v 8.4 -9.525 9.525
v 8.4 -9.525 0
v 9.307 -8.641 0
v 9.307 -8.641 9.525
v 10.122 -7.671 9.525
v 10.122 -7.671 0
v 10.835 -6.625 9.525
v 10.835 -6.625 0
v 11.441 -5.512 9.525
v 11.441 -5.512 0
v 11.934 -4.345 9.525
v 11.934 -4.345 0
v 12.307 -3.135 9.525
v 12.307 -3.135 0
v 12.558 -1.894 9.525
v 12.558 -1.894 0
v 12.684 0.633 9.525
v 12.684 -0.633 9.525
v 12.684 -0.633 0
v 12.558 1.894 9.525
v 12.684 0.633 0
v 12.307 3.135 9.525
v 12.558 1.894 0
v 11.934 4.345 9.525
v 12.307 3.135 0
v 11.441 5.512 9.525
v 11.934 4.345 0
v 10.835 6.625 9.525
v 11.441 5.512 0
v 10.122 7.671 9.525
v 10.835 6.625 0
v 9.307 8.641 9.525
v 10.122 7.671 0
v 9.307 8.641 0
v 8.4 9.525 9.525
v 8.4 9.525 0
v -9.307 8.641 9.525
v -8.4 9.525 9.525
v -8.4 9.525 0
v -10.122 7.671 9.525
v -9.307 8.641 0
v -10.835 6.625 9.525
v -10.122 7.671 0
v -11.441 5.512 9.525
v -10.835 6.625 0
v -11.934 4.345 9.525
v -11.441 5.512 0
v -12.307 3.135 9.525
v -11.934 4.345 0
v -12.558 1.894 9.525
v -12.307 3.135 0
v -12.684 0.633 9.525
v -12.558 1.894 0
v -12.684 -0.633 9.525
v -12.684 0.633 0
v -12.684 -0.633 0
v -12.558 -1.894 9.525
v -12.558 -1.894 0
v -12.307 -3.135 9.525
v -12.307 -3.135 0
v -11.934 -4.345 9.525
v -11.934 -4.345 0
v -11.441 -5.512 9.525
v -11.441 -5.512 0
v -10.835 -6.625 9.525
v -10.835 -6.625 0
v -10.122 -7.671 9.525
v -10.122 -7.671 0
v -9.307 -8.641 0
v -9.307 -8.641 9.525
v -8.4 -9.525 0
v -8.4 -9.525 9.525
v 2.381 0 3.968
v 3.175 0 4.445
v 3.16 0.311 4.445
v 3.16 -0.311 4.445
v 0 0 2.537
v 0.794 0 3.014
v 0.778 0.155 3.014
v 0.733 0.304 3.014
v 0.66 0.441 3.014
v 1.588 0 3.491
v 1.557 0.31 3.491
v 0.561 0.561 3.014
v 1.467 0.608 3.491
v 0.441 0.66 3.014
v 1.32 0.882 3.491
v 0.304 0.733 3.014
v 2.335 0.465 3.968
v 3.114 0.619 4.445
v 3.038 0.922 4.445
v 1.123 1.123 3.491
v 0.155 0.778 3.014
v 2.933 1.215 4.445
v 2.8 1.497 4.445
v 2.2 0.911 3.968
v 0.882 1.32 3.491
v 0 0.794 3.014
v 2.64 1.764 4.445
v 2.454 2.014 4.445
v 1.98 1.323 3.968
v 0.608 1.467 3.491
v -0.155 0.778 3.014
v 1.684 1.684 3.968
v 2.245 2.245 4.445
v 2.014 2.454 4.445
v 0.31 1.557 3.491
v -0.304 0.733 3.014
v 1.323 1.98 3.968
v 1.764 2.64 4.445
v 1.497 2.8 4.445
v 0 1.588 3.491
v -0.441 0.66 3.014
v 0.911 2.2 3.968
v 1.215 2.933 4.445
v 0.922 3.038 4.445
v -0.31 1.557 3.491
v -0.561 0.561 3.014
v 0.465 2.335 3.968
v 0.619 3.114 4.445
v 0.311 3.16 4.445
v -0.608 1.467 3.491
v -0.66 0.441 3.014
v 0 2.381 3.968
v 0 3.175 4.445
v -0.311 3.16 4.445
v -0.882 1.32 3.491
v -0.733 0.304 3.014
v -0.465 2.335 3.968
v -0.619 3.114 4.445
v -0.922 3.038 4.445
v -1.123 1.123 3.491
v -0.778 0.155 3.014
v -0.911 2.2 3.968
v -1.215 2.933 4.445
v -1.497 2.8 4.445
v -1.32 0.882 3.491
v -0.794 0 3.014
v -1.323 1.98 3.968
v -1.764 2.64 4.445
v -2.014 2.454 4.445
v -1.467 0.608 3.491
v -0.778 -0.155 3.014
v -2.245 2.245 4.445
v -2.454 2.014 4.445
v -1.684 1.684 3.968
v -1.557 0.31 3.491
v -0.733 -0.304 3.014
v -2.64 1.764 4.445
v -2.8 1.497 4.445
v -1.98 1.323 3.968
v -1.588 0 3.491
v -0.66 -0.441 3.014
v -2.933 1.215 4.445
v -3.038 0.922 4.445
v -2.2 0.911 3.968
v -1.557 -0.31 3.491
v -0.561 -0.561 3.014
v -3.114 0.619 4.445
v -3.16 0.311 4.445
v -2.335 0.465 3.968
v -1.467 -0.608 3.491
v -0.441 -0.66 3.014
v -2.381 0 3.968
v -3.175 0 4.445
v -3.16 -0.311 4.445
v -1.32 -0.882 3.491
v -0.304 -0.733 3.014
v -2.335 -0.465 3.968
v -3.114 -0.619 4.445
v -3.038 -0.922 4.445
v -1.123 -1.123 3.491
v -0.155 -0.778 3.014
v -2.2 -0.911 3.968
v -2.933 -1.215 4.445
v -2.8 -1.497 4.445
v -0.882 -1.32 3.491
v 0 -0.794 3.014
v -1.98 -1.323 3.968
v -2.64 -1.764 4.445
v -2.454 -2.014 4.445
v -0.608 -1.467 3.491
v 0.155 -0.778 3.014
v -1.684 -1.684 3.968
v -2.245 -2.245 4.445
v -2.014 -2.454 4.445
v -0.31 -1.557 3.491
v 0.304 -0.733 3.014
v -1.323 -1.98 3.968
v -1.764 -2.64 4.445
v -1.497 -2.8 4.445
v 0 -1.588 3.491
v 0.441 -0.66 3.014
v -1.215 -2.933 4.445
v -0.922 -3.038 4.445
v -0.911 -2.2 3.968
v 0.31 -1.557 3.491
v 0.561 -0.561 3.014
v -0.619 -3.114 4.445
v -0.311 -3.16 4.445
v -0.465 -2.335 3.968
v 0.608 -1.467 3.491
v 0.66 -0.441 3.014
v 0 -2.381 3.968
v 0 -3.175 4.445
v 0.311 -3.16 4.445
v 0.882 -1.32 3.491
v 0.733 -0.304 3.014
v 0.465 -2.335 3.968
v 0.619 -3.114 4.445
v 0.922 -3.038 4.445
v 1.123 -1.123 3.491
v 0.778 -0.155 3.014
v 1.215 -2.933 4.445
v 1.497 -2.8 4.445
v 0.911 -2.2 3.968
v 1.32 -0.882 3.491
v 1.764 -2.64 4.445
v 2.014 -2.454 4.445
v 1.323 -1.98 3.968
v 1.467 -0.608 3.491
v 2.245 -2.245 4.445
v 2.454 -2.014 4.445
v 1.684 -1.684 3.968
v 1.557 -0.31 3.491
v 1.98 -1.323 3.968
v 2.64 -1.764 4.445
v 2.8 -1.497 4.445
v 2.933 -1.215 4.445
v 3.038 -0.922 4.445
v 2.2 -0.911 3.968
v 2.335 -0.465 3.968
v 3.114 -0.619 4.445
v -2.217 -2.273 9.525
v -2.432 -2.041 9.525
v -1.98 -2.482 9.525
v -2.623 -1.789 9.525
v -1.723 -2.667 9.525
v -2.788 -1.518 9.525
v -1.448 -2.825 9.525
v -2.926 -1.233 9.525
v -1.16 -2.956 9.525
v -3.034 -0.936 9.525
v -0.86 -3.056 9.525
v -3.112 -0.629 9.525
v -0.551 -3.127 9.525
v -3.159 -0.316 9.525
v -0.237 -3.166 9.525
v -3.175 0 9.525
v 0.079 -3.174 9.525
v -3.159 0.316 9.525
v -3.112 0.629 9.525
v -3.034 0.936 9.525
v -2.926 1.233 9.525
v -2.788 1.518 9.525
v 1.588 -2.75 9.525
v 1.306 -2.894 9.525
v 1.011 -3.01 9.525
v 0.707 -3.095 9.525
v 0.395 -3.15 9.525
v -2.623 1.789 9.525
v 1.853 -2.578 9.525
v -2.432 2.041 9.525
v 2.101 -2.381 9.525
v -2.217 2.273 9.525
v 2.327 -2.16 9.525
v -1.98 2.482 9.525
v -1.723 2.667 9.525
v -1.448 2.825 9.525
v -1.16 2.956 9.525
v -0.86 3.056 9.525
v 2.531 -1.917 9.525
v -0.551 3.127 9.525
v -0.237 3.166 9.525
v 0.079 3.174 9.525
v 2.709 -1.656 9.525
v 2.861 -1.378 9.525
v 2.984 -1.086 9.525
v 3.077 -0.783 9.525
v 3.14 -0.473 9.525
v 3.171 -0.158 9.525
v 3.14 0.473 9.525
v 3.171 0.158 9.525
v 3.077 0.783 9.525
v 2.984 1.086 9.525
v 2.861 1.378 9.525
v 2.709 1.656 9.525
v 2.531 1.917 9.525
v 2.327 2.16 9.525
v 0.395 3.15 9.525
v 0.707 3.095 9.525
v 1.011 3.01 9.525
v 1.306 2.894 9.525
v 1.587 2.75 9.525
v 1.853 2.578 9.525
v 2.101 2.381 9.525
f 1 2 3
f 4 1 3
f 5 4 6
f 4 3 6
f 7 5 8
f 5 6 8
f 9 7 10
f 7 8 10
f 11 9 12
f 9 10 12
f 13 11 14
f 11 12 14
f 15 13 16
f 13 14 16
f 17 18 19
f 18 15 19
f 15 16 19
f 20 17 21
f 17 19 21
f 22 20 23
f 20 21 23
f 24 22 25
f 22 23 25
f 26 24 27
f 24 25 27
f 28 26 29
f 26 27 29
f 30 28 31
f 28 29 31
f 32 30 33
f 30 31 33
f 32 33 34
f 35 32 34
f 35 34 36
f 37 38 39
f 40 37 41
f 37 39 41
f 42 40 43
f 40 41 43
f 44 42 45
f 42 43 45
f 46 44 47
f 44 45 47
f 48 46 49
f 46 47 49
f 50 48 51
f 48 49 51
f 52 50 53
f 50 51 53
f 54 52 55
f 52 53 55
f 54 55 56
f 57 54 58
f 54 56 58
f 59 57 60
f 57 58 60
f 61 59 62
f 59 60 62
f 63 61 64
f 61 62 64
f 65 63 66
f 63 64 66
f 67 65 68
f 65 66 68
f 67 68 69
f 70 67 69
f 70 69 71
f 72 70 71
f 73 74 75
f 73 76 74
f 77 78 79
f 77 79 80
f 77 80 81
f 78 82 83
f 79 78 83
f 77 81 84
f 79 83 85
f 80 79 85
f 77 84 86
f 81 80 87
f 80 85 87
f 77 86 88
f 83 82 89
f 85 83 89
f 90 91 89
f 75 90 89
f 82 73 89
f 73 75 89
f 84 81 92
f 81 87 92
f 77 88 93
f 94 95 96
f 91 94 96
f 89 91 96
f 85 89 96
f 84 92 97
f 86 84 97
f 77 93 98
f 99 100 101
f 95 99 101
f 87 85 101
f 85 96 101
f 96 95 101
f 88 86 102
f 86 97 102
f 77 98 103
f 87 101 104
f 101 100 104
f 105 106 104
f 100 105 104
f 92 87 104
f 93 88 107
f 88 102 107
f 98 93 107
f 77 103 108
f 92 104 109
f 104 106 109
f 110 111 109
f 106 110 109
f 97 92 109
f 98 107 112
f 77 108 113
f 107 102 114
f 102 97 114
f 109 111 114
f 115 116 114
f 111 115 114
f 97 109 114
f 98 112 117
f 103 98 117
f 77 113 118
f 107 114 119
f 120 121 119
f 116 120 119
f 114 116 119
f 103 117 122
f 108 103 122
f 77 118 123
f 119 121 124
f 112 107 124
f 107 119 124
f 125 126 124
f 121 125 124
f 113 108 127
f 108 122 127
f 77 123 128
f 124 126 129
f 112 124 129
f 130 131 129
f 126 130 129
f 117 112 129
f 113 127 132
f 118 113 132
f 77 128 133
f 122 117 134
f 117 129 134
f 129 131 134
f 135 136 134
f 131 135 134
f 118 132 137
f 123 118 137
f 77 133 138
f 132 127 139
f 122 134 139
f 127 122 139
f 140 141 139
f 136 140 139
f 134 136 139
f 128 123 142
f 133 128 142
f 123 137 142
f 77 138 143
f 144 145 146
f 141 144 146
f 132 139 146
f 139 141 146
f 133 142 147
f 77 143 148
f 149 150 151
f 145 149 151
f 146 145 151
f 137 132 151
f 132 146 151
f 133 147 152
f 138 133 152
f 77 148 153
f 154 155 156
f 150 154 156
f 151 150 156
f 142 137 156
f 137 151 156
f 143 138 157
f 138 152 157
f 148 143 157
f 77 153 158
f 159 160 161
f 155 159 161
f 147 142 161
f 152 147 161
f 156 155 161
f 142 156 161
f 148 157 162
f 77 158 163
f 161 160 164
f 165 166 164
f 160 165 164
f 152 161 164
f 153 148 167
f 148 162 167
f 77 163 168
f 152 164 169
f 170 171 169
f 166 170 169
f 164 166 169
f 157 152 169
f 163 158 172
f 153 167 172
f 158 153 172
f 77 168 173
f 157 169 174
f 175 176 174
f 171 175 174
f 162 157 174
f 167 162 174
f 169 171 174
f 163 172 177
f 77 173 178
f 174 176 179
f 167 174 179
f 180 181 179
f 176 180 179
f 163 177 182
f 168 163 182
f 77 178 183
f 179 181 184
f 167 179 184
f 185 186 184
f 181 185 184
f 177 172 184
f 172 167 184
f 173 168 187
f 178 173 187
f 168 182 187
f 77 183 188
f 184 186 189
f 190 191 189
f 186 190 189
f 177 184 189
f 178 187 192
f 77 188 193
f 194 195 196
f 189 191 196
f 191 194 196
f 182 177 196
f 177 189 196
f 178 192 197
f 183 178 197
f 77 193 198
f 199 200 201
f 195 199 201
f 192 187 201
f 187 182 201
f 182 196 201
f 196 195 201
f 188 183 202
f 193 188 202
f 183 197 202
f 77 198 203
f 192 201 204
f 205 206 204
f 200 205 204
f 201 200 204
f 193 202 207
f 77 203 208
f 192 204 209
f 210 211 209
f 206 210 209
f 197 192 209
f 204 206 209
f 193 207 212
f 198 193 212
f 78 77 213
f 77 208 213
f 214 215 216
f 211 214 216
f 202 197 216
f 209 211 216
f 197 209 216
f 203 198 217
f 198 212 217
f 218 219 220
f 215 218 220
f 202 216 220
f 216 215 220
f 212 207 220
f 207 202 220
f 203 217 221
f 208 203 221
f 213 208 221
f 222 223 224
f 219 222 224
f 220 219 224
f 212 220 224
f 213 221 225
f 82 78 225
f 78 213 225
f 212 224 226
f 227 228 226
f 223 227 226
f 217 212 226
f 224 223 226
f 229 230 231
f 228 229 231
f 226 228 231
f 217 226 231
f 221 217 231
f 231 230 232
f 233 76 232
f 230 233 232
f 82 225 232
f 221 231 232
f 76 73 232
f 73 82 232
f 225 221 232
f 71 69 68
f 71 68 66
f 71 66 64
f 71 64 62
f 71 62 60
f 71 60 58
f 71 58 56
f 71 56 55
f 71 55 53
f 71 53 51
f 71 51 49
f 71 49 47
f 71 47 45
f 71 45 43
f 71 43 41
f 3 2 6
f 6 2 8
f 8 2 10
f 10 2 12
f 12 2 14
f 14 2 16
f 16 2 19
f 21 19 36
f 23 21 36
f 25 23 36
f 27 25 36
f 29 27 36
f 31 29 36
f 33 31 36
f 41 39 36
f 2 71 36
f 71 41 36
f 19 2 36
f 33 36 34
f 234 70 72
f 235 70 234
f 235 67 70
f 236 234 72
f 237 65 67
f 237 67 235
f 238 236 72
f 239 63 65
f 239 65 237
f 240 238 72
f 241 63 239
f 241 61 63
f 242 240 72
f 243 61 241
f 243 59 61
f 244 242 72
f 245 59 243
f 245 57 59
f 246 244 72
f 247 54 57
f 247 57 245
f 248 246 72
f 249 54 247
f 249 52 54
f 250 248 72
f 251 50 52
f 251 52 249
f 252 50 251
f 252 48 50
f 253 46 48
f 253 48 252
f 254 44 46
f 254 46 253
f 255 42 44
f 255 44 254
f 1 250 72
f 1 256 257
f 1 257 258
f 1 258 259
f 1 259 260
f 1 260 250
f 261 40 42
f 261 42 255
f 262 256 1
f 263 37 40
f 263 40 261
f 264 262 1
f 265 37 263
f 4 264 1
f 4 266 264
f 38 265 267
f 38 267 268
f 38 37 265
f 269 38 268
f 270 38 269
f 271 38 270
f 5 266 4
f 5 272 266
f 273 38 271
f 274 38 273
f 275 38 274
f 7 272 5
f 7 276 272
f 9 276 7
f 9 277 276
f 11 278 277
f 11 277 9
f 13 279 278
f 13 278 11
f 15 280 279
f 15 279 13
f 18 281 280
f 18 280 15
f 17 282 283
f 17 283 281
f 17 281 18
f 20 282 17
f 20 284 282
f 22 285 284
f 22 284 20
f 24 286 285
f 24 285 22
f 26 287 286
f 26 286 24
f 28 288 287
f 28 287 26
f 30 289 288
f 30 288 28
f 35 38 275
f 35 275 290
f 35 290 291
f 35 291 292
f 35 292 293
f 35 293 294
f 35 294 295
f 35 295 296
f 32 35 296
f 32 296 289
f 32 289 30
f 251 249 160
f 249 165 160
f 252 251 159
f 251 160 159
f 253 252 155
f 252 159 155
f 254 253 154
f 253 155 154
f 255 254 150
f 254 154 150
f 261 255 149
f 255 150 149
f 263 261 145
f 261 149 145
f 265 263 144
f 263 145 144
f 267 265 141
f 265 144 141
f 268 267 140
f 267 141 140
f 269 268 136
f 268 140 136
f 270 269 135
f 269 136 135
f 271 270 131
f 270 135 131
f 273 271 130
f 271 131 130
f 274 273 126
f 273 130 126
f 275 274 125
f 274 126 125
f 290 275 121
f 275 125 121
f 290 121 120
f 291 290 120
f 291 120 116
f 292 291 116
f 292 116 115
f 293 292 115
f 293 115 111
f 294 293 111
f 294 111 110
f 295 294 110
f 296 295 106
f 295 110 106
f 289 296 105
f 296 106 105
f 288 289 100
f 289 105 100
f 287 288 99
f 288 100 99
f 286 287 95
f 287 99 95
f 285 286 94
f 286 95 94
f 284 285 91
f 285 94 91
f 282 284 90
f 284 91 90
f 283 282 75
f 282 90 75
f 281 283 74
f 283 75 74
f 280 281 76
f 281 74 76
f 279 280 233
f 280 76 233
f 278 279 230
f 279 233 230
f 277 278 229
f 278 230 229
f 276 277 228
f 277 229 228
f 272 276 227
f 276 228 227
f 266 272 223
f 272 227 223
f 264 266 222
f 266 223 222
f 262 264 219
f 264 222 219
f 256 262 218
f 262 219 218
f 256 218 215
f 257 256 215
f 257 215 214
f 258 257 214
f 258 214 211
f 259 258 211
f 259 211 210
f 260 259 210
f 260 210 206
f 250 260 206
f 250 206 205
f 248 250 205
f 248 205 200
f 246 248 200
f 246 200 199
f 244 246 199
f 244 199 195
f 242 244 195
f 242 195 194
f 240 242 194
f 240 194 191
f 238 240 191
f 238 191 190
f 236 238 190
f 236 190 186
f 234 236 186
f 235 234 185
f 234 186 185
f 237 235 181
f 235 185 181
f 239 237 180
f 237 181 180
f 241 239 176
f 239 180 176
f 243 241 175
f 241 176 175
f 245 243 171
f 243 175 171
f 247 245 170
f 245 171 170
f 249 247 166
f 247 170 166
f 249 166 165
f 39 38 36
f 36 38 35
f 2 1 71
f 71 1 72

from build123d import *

# Parameters (mm, degrees)
F0_R     = 12.7
F1_DEPTH = 9.525
F3_D     = 6.35
F3_DEPTH = 5.08
F3_TIP   = 1.9077324654
F5_DEPTH = 25.4


# Not quite as in the source:
# - a feature names something its author has since deleted; it is built from what else it names


with BuildPart() as f1:
    # F0 (on Top) → F1 (new body)
    with BuildSketch(Plane.XY):
        Circle(F0_R)
    extrude(amount=F1_DEPTH)

    # F3
    with Locations(Plane.XY.offset(9.525)):
        with Locations((0, 0)):
            Hole(F3_D / 2, depth=F3_DEPTH)
            with Locations((0, 0, -(F3_DEPTH + F3_TIP / 2))):  # 118° drill point
                Cone(0, F3_D / 2, F3_TIP, mode=Mode.SUBTRACT)

    # F4 (on face) → F5 (cut)
    with BuildSketch(Plane.XY.offset(9.525)):
        with BuildLine():
            Line((19.05, -9.525), (19.05, 9.525))
            Line((19.05, 9.525), (8.4002604126, 9.525))
            ThreePointArc((8.4002604126, 9.525), (11.5752604126, 5.2252604126), (12.7, 0))
            ThreePointArc((12.7, 0), (11.5752604126, -5.2252604126), (8.4002604126, -9.525))
            Line((8.4002604126, -9.525), (19.05, -9.525))
        make_face()
        with BuildLine():
            ThreePointArc((-8.4002604126, -9.525), (-12.7, 0), (-8.4002604126, 9.525))
            Line((-8.4002604126, 9.525), (-19.05, 9.525))
            Line((-19.05, 9.525), (-19.05, -9.525))
            Line((-19.05, -9.525), (-8.4002604126, -9.525))
        make_face()
        with BuildLine():
            ThreePointArc((-8.4002604126, -9.525), (0, -12.7), (8.4002604126, -9.525))
            Line((8.4002604126, -9.525), (-8.4002604126, -9.525))
        make_face()
        with BuildLine():
            Line((-8.4002604126, 9.525), (8.4002604126, 9.525))
            ThreePointArc((8.4002604126, 9.525), (0, 12.7), (-8.4002604126, 9.525))
        make_face()
    extrude(amount=-F5_DEPTH, mode=Mode.SUBTRACT)


solid = f1.part
